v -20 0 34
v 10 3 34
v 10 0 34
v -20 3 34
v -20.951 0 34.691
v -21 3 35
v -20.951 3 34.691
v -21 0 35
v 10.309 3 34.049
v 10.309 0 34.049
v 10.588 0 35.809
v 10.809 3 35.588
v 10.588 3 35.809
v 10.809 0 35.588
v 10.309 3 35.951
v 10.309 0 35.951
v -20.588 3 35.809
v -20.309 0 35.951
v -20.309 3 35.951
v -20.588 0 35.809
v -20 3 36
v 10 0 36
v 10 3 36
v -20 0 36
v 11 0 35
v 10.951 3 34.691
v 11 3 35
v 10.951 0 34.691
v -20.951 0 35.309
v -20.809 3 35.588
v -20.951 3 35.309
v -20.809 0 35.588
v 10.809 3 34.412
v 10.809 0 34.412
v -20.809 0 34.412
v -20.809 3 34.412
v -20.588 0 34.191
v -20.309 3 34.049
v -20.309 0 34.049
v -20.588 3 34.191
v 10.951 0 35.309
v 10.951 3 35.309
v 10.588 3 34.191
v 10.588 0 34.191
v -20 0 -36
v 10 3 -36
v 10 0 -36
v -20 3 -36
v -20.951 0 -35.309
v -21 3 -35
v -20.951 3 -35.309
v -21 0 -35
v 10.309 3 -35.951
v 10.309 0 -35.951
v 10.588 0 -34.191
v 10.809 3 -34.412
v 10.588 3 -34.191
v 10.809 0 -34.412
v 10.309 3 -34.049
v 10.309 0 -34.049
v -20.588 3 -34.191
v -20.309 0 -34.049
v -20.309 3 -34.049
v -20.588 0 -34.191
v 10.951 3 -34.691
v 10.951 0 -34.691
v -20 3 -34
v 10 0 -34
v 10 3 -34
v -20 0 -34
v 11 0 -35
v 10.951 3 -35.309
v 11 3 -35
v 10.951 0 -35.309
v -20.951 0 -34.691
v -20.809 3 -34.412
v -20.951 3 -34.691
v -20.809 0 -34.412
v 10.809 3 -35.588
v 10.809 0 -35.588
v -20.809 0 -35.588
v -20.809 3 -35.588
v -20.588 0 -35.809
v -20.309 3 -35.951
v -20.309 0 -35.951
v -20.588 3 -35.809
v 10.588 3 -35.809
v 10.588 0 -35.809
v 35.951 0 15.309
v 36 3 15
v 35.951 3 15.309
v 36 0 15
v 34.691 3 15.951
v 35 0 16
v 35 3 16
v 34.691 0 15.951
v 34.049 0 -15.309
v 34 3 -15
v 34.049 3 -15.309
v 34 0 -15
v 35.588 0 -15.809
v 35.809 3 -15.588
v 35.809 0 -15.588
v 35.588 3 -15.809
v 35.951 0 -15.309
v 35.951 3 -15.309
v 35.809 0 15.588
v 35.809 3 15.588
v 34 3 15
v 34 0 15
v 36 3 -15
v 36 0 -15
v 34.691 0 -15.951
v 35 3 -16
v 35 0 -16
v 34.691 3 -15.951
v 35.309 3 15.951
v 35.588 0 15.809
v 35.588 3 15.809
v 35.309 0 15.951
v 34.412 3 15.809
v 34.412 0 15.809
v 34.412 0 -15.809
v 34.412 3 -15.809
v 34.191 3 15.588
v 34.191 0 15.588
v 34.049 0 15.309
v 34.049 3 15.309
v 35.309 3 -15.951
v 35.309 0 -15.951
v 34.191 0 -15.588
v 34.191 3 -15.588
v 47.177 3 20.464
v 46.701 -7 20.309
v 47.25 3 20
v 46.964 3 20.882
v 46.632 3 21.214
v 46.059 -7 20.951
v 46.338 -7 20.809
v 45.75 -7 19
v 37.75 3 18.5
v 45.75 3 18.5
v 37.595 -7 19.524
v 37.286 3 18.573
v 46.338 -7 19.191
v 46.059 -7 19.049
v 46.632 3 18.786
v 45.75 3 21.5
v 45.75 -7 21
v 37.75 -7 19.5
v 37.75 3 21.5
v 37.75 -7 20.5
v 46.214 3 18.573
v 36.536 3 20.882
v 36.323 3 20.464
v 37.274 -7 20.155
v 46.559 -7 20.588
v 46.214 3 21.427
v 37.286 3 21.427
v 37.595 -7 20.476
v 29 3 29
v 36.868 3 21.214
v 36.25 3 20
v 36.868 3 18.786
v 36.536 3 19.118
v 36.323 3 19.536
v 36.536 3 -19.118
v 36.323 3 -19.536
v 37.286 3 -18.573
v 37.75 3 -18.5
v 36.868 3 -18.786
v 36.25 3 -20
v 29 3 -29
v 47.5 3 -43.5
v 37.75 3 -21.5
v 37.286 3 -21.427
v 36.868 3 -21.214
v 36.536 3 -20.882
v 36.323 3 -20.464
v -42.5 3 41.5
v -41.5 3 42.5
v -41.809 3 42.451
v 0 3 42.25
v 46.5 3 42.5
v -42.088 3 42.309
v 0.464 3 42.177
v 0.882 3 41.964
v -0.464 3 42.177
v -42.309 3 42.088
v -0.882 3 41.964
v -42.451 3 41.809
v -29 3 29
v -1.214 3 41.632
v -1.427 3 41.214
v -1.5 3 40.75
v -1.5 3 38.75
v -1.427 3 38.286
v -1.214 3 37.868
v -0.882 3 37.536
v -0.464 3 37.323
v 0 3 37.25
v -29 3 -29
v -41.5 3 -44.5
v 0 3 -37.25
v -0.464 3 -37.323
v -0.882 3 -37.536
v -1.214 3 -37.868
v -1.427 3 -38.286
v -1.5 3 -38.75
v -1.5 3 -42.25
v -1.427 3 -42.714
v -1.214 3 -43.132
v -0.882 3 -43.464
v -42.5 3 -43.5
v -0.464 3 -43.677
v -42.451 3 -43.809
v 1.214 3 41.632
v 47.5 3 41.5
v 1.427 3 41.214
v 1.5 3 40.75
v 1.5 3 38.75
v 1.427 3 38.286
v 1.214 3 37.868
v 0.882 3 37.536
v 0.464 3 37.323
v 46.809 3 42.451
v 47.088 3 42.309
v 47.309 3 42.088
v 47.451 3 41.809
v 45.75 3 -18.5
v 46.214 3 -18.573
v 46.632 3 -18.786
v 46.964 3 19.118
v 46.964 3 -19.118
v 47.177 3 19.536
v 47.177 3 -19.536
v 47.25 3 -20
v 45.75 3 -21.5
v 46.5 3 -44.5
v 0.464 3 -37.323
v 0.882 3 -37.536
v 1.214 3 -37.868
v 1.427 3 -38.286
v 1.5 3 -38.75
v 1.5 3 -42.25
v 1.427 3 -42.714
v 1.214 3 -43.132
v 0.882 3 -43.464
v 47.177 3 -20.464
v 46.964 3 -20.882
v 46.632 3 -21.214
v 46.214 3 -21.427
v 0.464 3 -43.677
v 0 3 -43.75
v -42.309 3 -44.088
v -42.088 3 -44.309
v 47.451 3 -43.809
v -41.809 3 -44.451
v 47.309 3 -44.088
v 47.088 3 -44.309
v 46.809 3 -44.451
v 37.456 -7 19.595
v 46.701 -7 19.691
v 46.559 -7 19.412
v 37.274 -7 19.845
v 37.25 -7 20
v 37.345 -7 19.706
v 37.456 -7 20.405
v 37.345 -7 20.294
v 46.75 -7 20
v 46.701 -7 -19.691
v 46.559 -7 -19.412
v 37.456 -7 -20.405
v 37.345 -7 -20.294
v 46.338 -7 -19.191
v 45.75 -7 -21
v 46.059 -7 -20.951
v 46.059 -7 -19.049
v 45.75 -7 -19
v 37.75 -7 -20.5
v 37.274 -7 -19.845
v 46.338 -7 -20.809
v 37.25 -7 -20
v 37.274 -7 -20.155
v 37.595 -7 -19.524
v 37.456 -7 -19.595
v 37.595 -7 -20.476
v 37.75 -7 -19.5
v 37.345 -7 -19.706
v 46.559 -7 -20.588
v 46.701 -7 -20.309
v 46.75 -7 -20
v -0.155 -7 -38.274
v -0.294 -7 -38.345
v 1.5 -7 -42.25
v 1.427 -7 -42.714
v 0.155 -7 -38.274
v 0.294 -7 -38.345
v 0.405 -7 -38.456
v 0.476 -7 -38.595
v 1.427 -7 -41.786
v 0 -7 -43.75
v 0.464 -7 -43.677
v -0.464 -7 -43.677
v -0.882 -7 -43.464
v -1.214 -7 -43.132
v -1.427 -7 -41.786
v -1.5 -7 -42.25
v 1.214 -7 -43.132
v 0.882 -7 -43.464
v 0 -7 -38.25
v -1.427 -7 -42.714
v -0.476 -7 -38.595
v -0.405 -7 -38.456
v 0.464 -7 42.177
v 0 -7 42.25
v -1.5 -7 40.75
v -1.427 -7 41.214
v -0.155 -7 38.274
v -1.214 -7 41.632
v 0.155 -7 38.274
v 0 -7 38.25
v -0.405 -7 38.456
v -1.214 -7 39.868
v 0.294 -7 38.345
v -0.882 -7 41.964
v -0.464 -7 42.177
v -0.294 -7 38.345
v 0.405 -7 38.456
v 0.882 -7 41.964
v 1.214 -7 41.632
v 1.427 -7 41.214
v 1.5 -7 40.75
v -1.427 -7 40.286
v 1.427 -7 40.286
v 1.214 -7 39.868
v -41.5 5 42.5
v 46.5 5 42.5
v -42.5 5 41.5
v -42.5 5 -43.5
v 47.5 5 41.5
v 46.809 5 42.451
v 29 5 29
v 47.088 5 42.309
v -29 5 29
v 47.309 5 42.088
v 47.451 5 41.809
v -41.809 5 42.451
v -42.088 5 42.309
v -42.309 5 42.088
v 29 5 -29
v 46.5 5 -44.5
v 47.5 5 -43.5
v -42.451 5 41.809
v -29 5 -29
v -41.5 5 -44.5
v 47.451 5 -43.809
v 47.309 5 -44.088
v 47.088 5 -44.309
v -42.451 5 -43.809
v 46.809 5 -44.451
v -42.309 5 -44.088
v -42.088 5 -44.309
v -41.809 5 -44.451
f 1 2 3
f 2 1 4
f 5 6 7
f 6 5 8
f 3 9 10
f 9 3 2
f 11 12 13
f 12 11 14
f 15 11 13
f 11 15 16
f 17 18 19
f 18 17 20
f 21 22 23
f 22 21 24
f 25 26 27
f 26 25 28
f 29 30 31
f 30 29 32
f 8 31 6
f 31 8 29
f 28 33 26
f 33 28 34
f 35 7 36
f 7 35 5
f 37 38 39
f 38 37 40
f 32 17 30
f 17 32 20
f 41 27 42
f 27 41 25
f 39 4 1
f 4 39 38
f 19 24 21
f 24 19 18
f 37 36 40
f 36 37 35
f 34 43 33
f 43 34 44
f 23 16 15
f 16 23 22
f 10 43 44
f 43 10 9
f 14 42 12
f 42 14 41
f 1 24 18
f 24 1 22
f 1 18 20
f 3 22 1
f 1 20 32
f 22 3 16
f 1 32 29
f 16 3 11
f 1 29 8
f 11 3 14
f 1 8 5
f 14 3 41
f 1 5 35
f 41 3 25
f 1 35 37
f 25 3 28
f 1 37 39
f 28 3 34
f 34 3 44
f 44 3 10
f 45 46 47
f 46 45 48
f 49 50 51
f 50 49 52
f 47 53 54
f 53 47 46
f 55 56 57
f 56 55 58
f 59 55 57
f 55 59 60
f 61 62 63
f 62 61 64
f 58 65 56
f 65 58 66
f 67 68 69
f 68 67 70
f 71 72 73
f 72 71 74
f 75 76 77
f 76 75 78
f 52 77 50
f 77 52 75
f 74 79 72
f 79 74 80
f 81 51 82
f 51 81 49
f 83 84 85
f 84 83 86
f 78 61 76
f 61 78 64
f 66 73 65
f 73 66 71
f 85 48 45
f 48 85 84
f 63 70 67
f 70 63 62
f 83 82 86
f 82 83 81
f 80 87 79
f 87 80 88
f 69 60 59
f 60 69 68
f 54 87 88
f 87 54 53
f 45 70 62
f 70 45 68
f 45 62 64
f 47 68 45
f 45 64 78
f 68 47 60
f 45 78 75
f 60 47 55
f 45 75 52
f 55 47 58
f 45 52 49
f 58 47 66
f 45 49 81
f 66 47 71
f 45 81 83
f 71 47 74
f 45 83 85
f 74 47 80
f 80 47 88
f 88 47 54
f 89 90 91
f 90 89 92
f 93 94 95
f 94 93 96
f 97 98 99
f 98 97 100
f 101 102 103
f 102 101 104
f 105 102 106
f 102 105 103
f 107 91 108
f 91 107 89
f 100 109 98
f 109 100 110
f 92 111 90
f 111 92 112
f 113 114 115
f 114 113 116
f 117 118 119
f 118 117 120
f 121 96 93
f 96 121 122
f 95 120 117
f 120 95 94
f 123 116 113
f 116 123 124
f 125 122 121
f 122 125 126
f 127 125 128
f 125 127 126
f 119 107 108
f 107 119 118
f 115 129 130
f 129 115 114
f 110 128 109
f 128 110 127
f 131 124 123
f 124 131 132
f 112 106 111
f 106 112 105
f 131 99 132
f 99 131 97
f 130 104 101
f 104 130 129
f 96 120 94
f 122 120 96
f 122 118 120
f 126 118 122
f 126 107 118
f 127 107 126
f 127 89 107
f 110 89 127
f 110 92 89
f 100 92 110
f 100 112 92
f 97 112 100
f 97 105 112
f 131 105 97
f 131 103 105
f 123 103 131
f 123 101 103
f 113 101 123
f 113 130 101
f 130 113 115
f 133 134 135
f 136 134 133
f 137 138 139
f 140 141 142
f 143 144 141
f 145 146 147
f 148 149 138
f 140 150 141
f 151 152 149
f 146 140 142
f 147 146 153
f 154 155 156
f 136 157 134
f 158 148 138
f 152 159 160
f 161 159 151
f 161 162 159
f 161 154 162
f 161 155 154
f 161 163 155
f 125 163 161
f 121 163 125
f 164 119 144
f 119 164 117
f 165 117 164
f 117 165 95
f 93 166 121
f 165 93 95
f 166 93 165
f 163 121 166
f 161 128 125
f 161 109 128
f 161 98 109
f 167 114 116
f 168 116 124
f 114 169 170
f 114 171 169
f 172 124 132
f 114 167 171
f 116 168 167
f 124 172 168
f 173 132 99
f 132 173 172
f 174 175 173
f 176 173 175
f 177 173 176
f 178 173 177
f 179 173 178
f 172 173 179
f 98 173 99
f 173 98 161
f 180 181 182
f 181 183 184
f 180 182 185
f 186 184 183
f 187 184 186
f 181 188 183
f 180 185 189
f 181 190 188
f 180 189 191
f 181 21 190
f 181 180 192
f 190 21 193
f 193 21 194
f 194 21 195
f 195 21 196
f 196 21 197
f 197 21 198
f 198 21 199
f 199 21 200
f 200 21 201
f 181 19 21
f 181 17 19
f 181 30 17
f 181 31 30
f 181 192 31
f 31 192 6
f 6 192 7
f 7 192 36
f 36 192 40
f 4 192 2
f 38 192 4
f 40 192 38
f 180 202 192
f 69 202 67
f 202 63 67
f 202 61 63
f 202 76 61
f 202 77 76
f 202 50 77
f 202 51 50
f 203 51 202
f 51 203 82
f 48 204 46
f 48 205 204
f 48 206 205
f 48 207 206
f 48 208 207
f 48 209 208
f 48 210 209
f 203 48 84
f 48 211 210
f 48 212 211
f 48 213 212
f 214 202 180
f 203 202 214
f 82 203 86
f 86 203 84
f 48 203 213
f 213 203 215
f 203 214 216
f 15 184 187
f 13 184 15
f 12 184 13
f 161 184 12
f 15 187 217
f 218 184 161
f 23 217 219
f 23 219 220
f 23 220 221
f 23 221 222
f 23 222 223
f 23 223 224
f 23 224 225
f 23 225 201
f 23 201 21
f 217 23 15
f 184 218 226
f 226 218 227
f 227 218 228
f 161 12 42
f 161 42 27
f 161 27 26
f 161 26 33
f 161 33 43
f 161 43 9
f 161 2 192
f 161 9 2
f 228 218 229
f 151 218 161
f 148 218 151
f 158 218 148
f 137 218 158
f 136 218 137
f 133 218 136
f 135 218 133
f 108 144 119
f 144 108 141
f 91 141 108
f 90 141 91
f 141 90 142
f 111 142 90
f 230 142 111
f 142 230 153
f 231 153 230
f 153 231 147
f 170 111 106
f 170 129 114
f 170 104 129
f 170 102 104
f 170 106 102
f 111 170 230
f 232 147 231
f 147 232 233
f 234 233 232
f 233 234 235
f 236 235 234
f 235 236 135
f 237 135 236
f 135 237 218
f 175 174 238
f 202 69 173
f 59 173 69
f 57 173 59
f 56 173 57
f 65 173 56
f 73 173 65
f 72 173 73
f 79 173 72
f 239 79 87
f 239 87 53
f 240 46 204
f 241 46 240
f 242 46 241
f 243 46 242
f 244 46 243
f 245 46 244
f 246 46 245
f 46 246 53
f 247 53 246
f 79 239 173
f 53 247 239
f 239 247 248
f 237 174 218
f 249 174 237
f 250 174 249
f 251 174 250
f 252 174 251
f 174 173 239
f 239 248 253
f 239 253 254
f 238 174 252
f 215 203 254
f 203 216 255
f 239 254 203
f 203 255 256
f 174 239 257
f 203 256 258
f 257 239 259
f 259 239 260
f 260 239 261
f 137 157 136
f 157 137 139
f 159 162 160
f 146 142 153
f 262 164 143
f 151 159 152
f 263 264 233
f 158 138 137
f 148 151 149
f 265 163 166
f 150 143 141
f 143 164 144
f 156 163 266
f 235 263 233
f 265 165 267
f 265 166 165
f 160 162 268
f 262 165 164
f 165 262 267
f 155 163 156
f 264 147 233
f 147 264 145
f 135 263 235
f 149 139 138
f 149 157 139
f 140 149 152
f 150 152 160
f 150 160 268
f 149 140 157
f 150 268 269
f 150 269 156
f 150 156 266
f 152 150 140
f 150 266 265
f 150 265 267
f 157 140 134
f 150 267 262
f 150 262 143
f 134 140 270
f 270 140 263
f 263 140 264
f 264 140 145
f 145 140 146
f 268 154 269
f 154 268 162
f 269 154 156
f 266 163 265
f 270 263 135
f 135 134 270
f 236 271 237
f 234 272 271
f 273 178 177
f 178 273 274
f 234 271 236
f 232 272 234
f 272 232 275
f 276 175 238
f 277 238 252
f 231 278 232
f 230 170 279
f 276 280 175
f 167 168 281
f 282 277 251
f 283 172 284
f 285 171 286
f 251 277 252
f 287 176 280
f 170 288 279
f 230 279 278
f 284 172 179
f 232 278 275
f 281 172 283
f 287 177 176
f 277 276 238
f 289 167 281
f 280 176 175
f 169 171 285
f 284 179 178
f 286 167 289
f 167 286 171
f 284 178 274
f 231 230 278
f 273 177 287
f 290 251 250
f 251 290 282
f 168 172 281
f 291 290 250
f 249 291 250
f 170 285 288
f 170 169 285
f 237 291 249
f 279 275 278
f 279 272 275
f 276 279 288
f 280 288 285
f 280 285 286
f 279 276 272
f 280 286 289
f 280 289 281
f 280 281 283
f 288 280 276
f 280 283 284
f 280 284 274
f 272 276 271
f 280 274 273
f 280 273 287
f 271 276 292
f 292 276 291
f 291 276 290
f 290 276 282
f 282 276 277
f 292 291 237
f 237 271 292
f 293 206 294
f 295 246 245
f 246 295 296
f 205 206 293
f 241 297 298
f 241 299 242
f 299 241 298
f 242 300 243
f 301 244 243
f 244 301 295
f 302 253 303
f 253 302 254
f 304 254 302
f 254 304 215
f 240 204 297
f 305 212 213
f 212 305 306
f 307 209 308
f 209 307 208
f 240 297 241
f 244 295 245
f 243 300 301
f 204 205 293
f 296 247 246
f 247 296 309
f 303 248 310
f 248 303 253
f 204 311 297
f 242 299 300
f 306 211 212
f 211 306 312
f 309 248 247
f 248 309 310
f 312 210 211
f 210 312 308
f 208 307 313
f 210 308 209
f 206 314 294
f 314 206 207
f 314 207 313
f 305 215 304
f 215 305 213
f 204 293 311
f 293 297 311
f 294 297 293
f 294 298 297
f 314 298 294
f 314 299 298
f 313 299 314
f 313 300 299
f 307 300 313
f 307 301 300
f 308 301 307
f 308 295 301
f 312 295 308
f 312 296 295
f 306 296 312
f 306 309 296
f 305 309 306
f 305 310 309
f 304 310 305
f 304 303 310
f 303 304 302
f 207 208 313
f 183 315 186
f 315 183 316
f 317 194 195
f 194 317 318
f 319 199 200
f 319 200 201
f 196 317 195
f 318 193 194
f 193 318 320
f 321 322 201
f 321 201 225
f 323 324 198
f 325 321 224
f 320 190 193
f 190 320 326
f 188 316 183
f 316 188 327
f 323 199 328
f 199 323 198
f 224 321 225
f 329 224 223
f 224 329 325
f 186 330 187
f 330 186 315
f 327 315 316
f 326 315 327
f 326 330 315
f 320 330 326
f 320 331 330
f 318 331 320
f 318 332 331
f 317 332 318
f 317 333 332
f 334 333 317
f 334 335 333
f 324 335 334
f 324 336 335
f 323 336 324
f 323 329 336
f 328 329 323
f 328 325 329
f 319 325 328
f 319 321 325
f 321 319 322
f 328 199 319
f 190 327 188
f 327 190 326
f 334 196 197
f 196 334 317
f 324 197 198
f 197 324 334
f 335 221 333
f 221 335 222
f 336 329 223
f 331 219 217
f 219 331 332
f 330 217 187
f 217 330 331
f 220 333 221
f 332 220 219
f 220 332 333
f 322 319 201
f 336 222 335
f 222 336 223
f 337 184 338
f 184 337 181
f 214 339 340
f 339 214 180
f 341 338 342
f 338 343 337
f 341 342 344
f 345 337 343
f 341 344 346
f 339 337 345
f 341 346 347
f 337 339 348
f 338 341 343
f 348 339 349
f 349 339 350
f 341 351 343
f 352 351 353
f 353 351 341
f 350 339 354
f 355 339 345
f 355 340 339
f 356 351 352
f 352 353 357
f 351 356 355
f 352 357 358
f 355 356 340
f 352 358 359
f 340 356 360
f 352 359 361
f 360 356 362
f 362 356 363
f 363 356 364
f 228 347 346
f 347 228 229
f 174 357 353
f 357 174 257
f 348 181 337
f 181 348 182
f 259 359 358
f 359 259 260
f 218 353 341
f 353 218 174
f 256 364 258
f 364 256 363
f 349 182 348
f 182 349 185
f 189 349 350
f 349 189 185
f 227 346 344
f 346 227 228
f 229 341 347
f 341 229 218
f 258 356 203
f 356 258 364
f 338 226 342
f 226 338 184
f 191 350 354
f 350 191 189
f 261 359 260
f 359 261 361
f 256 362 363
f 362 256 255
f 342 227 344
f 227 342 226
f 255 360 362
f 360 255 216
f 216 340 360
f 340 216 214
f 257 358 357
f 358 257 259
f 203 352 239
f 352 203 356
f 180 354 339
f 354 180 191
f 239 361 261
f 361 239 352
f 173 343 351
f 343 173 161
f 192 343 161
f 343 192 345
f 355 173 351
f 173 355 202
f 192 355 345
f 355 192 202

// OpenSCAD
// file: ../instax.scad
// Instax Square cartridge prototype shape
module cartridge() {
    translate([-38, 0, -36.5])
	{
    // main body
    hull () {
        linear_extrude(height=0.01)
        polygon(points=[[0.5, 0],
                        [75.5, 0],
                        [76, -14],
                        [0, -14]]);
        translate([0, 0, 90])
        linear_extrude(height=0.01)
        polygon(points=[[0.5, 0],
                        [75.5, 0],
                        [76, -19], 
                        [0, -19]]);
    }

   // end grip
    translate([0, 0, 88])
    linear_extrude(height=2)
    polygon(points=[[-1.5, 1],
                    [77.5, 1],
                    [77.5, -19], 
                    [-1.5, -19]]);
    
   // end stop
    translate([0, 0, 72])
    linear_extrude(height=18)
    polygon(points=[[0.5, 1],
                    [75.5, 1],
                    [76, -18], 
                    [0, -18]]);
	}
    
    color("wheat")
    translate([31.5, 0, -36.5])
    cube(size = [2, 1, 25]);
    
    color("peru")
    translate([-32.5, 0, -32.5])
    cube(size = [65, 1, 65]);
}
// main file
include <../instax.scad>
$fn=20;

module film_plane() {
    translate([-29, -2.9, -29])
    cube([58, 8, 58]);
}

//color("cornflowerBlue")
//film_plane();

rotate([0, -90, 0])
%cartridge();

//translate([-42.5, -25, -44.5])
//cube([90, 30, 87]);

module cartridge_support() {
    module front_support() {
        hull() {
            translate([15, 4, 0])
            rotate([90,0,0])
            cylinder(d=2, h=4);
            
            translate([-15, 4, 0])
            rotate([90,0,0])
            cylinder(d=2, h=4);
        }
    }
    // front, -Z
    translate([-5, 0, 35])
    front_support();
    // front, +Z
    translate([-5, 0, -35])
    front_support();
    // front, +X
    translate([35, 0, 0])
    rotate([0, 90, 0])
    front_support();
    
    module bottom_support() {
        hull () {
            rotate([90,0,0])
            cylinder(d1=3, d2=1, h=10);
            
            translate([8, 0, 0])
            rotate([90,0,0])
            cylinder(d1=3, d2=2, h=10);
        }
    }
    
    translate([37.75, 3, 20])
    bottom_support();
    
    translate([37.75, 3, -20])
    bottom_support();
    
    module side_support(stride) {
        hull () {
            translate([0, 0, -stride])
            rotate([90, 0, 0])
            cylinder(d1=3, d2=1, h=10);
            
            translate([0, 0, stride])
            rotate([90,0,0])
            cylinder(d1=3, d2=3, h=10);
        }
    }
    
    translate([0, 3, -40.5])
    rotate([0, 180, 0])
    side_support(stride=1.75);
    translate([0, 3, 39.75])
    side_support(stride=1.0);
}

cartridge_support();

module filmback() {
    // face, +Y
    difference() {
    hull () {
        translate([46.5, 5, -43.5])
        rotate([90,0,0])
        cylinder(d=2, h=2);
        translate([46.5, 5, 41.5])
        rotate([90,0,0])
        cylinder(d=2, h=2);
        translate([-41.5, 5, -43.5])
        rotate([90,0,0])
        cylinder(d=2, h=2);
        translate([-41.5, 5, 41.5])
        rotate([90,0,0])
        cylinder(d=2, h=2);
    }
    film_plane();
    }
    
    module walls () {
        // bottom, +X
        hull () {
            translate([46.5, 5, -43.5])
            rotate([90, 0, 0])
            cylinder(d=2, h=25);
            translate([46.5, 5, 41.5])
            rotate([90,0,0])
            cylinder(d=2, h=25);
        }
        
        // base, -Z
        hull () {
            translate([46.5, 5, -43.5])
            rotate([90,0,0])
            cylinder(d=2, h=25);
            translate([-41.5, 5, -43.5])
            rotate([90,0,0])
            cylinder(d=2, h=25);
        }
        
        // base, -Z
        hull () {
            translate([46.5, 5, 41.5])
            rotate([90,0,0])
            cylinder(d=2, h=25);
            translate([-41.5, 5, 41.5])
            rotate([90,0,0])
            cylinder(d=2, h=25);
        }
    }
}
filmback();
